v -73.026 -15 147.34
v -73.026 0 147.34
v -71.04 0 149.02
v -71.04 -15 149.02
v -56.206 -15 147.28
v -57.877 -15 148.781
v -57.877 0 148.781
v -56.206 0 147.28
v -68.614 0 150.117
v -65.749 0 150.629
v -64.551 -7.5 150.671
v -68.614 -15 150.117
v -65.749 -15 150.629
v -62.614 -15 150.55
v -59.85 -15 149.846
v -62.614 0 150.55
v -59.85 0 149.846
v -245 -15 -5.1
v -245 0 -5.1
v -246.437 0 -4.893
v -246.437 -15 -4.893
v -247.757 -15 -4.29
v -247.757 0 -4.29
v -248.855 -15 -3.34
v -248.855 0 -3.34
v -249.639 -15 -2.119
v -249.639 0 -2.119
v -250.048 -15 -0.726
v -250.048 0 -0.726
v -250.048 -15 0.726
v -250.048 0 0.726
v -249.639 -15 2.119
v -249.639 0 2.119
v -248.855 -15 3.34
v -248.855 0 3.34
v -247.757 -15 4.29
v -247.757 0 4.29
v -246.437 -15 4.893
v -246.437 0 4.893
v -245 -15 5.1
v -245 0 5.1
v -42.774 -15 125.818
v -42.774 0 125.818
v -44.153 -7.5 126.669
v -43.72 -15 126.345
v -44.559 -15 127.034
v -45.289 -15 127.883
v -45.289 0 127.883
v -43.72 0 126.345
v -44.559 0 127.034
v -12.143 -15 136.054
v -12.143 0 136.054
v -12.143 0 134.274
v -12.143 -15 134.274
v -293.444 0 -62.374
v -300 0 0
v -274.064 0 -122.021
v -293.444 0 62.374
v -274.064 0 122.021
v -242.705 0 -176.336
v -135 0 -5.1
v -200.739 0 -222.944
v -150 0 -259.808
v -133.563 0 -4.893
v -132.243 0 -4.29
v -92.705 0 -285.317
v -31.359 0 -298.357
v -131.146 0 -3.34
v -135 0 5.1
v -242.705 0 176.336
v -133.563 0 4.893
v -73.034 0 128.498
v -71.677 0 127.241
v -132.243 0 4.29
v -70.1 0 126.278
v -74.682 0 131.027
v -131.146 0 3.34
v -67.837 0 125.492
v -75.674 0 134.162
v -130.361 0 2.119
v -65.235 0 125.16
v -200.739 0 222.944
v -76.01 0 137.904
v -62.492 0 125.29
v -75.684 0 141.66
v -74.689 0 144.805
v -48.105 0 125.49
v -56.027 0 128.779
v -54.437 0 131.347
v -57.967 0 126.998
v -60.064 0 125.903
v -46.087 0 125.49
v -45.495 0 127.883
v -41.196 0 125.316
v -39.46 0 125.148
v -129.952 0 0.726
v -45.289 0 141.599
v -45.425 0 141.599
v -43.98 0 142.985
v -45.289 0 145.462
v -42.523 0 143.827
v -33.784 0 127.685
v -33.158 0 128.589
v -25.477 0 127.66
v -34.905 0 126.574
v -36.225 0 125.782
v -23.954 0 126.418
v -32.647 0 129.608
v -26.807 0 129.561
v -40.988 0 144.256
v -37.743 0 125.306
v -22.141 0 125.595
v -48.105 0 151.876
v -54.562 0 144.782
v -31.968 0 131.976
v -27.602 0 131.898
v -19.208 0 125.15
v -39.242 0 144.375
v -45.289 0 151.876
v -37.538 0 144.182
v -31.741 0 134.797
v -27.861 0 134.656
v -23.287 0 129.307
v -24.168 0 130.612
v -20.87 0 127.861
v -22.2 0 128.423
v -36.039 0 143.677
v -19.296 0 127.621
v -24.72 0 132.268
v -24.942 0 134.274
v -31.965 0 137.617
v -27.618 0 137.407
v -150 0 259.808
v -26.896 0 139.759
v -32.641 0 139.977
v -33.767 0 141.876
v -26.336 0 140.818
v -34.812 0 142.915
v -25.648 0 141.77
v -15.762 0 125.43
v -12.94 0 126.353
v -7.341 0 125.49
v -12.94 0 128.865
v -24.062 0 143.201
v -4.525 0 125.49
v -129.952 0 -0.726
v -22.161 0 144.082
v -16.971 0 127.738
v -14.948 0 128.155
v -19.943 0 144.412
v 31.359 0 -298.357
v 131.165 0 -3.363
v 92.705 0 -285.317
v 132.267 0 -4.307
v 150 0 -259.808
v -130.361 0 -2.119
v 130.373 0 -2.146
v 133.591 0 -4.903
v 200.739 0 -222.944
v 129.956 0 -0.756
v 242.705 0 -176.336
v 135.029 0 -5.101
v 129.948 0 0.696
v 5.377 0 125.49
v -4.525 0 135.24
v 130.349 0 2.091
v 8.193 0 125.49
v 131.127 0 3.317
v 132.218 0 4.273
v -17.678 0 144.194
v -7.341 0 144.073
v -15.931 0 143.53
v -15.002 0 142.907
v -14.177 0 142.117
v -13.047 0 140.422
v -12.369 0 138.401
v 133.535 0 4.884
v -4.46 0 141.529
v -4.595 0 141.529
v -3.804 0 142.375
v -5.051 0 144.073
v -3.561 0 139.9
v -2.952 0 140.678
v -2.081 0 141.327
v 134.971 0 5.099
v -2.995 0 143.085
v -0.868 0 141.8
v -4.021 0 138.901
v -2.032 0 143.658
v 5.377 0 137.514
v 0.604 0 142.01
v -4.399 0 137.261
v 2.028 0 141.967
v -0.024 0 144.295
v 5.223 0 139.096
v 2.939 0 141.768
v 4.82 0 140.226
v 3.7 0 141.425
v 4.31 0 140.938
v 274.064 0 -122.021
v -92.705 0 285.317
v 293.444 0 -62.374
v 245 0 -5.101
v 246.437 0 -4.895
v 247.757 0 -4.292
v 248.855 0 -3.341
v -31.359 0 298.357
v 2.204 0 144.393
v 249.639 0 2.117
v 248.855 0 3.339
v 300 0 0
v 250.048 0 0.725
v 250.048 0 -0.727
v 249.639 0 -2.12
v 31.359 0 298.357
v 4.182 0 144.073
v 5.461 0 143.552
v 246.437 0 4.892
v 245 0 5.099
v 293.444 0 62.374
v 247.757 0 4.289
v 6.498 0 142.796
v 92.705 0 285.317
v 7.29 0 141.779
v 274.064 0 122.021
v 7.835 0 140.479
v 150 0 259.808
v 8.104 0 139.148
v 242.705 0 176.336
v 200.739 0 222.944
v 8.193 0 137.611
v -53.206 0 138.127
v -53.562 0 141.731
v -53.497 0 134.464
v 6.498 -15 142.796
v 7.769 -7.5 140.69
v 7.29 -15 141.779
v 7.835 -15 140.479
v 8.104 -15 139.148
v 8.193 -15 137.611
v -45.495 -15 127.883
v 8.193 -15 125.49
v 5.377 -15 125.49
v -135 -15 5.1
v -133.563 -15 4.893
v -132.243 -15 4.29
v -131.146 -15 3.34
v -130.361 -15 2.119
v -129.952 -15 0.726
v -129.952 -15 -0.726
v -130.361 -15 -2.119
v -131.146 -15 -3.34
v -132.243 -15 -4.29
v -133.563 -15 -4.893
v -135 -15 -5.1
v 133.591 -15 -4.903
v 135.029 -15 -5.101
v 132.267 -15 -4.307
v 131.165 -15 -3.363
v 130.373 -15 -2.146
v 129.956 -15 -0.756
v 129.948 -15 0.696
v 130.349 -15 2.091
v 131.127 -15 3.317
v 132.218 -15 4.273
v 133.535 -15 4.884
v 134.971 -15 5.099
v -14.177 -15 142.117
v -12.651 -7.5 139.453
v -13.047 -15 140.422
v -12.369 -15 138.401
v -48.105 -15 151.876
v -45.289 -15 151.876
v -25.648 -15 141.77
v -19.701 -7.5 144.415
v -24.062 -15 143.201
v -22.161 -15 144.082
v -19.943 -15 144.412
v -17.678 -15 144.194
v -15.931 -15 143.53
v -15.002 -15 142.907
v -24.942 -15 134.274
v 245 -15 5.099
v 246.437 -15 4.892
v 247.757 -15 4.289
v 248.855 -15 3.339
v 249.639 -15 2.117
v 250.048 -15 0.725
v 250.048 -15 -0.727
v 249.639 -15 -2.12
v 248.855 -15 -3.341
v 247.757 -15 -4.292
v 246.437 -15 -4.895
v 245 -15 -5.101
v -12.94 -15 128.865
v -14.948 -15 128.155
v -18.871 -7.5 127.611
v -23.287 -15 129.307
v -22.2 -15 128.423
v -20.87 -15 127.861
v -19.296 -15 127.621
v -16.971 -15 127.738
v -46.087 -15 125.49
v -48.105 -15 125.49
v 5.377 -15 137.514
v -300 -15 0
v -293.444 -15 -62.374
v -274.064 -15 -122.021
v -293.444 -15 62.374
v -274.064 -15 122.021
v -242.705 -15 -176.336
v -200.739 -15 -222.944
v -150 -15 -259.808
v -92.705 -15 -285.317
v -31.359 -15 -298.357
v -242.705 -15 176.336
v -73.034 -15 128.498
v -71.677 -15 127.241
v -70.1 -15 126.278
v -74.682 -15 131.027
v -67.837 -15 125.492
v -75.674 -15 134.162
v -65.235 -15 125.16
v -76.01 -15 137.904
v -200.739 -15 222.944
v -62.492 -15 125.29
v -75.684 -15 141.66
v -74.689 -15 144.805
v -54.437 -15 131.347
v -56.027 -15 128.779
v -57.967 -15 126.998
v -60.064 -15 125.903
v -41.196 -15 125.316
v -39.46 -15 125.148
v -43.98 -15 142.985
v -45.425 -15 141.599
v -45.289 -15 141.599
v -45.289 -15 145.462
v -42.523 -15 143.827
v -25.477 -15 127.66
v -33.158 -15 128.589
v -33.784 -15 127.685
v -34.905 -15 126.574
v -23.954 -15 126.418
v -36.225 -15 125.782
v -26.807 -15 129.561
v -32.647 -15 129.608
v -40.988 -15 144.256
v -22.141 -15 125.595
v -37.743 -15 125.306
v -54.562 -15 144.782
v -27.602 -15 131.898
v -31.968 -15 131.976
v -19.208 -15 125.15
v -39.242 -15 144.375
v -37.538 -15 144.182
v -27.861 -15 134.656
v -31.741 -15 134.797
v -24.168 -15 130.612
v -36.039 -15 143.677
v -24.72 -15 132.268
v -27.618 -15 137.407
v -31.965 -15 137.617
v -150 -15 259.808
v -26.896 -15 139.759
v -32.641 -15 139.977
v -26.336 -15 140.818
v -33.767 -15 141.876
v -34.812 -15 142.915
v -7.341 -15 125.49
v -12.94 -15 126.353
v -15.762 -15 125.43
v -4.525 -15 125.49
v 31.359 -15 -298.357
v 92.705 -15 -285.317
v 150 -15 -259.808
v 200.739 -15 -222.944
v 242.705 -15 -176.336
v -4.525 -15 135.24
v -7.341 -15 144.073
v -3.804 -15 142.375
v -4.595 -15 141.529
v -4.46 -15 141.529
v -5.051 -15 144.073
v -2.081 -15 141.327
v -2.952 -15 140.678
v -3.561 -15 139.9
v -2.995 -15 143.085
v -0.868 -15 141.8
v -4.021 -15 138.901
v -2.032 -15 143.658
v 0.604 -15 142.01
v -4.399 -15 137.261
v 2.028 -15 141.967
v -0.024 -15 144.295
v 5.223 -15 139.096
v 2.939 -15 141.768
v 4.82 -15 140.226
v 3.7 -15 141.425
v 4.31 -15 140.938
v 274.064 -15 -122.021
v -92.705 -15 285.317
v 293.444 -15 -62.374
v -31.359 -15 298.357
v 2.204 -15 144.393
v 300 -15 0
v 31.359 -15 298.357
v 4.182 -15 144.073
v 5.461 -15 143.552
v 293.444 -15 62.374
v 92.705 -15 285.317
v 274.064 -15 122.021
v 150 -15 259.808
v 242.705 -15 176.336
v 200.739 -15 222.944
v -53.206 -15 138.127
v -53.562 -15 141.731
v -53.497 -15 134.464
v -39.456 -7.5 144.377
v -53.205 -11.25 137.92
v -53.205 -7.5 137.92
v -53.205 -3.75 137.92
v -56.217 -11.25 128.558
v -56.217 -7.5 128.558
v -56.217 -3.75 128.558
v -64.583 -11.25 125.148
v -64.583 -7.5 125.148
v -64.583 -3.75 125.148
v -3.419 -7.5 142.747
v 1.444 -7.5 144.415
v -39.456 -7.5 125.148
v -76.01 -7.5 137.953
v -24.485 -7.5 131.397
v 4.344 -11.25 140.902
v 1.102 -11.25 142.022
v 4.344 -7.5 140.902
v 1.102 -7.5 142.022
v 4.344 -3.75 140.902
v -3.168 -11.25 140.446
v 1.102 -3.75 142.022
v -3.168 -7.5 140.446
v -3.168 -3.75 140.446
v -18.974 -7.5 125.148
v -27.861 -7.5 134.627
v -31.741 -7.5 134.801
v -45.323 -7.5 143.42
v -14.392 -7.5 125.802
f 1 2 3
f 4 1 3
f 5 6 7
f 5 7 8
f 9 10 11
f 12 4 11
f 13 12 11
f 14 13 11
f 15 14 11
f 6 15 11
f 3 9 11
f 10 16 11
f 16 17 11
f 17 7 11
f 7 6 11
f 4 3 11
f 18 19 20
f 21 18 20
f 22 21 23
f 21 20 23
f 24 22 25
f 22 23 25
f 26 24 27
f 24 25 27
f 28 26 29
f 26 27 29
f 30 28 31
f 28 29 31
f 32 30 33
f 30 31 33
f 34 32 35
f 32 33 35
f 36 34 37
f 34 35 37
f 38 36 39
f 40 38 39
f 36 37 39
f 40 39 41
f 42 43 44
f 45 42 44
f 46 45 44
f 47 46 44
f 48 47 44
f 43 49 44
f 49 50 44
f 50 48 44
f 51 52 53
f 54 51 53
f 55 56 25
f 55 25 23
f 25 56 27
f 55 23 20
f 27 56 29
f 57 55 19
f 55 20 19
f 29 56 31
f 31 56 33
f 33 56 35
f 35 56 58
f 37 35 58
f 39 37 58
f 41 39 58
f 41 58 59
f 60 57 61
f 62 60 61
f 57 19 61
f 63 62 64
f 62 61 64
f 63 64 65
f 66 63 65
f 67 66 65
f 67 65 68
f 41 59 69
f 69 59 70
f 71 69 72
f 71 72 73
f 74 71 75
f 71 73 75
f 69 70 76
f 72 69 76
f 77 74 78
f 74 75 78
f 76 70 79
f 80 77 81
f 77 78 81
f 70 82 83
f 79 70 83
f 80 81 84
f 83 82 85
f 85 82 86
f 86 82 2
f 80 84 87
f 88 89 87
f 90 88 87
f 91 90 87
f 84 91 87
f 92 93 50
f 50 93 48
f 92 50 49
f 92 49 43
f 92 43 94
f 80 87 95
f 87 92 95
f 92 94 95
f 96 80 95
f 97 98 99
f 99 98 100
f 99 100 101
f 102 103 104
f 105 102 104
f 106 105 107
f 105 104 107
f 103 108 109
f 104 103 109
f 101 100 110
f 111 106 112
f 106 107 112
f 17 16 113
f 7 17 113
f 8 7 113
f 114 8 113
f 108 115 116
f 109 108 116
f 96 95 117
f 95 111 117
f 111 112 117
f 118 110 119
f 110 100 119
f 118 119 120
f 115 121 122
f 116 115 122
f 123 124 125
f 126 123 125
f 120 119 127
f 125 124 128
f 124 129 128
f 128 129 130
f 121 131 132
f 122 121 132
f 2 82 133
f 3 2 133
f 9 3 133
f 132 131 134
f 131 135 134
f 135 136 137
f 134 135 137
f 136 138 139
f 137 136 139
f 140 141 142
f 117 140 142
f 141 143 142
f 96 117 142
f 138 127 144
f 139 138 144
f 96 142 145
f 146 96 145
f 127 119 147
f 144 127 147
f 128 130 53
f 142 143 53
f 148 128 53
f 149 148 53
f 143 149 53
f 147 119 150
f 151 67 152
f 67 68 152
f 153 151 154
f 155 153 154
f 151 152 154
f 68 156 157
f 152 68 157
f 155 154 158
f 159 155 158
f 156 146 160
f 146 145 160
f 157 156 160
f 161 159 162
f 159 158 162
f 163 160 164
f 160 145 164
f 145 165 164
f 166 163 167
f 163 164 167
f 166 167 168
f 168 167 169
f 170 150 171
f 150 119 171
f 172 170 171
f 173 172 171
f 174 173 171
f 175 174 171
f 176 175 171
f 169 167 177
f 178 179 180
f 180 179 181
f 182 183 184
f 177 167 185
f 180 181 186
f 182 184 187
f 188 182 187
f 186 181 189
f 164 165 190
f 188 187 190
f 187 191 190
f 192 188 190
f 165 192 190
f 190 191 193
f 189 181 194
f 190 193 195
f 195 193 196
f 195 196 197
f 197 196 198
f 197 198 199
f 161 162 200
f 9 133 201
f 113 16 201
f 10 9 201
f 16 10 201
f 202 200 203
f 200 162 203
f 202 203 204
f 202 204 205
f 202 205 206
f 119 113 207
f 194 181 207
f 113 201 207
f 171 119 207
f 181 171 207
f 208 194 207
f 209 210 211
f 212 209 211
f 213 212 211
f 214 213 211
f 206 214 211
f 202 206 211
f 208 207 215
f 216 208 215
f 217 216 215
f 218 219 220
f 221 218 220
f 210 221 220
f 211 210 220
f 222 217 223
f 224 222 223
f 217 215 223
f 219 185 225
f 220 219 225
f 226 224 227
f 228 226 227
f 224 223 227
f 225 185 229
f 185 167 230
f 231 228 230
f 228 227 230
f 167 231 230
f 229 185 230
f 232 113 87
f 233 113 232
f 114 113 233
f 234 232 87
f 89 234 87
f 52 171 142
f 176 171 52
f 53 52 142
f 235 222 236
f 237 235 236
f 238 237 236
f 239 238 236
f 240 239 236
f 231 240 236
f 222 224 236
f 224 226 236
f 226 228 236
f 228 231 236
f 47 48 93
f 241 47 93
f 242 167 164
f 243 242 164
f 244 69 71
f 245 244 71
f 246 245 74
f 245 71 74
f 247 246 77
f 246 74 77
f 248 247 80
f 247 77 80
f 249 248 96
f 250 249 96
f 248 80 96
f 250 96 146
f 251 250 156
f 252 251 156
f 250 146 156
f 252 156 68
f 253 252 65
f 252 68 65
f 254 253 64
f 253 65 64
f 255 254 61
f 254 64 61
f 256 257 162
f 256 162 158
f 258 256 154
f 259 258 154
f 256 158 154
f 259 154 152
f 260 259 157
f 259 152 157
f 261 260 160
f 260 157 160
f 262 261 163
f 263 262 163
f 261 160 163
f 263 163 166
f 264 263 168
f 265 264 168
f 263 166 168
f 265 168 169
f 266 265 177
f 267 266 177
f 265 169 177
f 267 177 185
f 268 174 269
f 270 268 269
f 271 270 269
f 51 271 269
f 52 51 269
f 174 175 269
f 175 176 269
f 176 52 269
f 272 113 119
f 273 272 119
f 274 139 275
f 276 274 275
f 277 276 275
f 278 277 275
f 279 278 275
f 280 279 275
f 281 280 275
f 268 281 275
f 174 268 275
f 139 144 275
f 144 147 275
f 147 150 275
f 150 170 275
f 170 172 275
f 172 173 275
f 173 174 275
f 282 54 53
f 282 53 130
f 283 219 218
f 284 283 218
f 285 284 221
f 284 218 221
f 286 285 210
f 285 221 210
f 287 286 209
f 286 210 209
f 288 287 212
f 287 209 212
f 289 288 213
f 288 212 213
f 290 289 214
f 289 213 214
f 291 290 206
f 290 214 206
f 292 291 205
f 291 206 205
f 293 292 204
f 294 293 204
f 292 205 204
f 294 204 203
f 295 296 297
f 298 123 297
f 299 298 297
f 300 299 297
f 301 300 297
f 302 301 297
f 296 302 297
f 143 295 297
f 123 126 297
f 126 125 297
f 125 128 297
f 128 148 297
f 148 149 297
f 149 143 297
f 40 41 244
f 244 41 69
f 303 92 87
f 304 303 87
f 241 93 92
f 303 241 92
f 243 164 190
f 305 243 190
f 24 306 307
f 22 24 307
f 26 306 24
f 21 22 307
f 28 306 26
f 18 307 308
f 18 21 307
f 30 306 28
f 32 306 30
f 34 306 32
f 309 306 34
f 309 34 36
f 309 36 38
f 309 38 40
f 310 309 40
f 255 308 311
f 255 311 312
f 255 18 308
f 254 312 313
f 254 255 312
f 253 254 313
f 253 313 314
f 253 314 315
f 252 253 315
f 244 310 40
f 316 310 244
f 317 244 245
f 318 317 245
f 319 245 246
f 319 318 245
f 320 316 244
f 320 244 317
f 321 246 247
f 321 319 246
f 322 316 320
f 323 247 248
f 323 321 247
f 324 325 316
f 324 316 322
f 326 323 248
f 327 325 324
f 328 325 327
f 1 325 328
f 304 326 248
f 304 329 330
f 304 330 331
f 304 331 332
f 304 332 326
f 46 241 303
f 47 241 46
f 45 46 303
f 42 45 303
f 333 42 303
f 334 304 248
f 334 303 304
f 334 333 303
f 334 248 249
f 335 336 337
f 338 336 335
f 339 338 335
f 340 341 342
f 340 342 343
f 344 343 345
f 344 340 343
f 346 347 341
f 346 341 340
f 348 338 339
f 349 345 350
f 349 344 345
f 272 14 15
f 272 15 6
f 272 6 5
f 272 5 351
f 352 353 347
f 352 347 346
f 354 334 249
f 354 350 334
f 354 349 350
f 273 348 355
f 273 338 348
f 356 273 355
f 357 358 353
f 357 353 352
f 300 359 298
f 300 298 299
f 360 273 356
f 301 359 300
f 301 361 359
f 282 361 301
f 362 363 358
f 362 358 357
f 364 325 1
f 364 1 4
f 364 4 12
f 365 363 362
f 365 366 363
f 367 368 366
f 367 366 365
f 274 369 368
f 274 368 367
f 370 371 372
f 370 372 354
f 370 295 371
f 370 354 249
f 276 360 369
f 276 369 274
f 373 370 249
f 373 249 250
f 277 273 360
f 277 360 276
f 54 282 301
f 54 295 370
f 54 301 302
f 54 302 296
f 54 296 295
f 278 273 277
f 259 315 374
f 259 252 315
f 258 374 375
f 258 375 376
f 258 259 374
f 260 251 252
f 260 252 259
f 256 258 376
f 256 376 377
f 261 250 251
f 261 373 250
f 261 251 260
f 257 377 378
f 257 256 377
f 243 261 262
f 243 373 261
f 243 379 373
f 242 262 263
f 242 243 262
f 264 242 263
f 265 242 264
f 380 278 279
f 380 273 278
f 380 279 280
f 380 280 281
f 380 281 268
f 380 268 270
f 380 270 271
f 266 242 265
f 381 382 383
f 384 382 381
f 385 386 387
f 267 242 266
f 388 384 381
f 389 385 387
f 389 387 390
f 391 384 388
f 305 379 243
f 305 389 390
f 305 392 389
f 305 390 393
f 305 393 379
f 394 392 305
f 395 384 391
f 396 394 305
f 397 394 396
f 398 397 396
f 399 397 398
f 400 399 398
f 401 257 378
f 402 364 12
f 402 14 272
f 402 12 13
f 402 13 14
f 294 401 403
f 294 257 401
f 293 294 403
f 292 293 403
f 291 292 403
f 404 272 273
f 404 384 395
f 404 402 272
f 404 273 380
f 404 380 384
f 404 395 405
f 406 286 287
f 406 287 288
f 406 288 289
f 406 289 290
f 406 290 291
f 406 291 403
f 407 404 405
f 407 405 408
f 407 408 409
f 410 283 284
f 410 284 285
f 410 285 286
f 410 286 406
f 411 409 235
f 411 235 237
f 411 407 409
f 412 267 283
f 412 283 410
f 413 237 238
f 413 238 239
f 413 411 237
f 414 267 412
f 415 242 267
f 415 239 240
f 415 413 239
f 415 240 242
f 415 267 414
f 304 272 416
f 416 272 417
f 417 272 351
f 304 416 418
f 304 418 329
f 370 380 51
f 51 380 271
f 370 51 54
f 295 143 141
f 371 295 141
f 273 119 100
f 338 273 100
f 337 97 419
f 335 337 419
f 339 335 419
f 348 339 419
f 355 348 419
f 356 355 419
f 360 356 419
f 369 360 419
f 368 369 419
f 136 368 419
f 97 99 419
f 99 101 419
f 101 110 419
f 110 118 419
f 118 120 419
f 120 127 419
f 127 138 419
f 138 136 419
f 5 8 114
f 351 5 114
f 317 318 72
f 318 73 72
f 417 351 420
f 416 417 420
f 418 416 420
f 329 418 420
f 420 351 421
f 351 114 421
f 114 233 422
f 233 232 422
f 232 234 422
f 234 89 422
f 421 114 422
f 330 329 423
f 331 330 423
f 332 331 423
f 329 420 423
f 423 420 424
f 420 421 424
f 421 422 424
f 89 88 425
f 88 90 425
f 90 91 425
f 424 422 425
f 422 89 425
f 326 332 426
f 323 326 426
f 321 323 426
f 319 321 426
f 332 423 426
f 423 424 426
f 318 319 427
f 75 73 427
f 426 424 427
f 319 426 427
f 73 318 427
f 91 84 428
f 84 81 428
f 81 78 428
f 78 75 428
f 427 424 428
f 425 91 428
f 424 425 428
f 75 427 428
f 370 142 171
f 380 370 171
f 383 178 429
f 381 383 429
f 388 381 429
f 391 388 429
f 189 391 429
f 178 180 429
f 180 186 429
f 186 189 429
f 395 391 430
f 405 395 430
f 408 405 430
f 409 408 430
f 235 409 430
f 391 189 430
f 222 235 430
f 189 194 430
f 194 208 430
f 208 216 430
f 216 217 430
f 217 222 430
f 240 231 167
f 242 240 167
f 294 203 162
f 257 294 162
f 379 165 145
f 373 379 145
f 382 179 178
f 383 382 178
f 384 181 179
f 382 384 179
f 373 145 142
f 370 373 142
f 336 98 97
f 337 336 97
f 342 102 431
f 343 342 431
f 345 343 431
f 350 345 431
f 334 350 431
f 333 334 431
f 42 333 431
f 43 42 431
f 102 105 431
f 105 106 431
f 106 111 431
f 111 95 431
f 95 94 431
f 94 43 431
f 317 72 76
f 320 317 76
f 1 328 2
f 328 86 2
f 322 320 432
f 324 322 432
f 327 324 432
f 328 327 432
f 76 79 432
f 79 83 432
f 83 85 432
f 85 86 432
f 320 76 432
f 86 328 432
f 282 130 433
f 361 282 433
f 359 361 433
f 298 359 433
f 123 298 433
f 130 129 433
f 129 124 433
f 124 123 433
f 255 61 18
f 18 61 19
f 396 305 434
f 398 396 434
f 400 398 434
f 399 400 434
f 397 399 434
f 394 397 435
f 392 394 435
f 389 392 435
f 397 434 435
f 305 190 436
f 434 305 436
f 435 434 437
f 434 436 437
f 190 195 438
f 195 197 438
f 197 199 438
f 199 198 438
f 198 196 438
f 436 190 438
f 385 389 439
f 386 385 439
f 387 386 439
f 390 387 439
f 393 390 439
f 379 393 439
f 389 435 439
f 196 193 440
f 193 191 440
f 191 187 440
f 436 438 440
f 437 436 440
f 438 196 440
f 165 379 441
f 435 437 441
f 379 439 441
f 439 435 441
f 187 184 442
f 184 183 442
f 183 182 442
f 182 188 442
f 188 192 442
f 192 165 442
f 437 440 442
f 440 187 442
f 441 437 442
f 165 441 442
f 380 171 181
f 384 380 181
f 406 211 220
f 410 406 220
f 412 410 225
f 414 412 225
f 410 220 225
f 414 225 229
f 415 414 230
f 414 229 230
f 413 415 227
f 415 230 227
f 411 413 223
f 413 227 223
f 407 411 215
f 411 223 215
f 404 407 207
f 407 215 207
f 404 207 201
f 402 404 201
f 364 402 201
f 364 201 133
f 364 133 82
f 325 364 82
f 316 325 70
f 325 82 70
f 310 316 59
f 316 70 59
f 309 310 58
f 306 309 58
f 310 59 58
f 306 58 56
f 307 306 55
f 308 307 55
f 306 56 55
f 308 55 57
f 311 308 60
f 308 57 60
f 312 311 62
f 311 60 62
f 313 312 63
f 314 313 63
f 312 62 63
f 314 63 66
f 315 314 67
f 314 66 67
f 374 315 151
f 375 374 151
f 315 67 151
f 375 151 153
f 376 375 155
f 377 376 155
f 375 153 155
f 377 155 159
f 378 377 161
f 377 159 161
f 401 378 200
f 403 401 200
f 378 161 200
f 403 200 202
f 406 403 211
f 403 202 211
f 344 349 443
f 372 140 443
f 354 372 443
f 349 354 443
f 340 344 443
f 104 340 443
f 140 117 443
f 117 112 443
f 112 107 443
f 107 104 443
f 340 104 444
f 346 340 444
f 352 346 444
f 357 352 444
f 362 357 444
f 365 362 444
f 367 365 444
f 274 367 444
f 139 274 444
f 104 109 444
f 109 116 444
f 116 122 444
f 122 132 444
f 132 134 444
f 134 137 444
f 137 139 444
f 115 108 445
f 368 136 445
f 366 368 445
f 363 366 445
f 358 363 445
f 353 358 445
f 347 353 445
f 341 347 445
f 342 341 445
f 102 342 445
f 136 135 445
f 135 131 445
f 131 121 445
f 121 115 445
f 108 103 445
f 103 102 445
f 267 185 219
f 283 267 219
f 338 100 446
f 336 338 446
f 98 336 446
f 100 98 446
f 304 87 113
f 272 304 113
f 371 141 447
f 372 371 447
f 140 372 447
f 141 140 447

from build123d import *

# Parameters (mm, degrees)
F0_R     = 300.0001975894
F1_DEPTH = 15


with BuildPart() as f1:
    # F0 (on Front) → F1 (new body)
    with BuildSketch(Plane.XZ):
        Circle(F0_R)
        with BuildLine():
            ThreePointArc((-245.0001975894, -5.1), (-250.1001975894, 0), (-245.0001975894, 5.1))
            Line((-245.0001975894, 5.1), (-135, 5.1))
            ThreePointArc((-135, 5.1), (-129.9, 0), (-135, -5.1))
            Line((-135, -5.1), (-245.0001975894, -5.1))
        make_face(mode=Mode.SUBTRACT)
        with BuildLine():
            ThreePointArc((135.0291466713, -5.1012321273), (129.9, -0.0303787986), (134.9708533287, 5.0987678727))
            Line((134.9708533287, 5.0987678727), (245.0001975894, 5.0987678727))
            ThreePointArc((245.0001975894, 5.0987678727), (250.1001975894, -0.0012321273), (245.0001975894, -5.1012321273))
            Line((245.0001975894, -5.1012321273), (135.0291466713, -5.1012321273))
        make_face(mode=Mode.SUBTRACT)
        with BuildLine():
            add(Edge.make_bspline(
                [(-56.2059473305, 147.280047389), (-53.2054559961, 143.8888953384), (-53.2054559961, 137.9204677295)],
                knots=[0, 0, 0, 1, 1, 1], degree=2))
            add(Edge.make_bspline(
                [(-53.2054559961, 137.9204677295), (-53.2054559961, 131.9683176504), (-56.216799017, 128.5581751484)],
                knots=[0, 0, 0, 1, 1, 1], degree=2))
            add(Edge.make_bspline(
                [(-56.216799017, 128.5581751484), (-59.2281420379, 125.1480326464), (-64.5834493561, 125.1480326464)],
                knots=[0, 0, 0, 1, 1, 1], degree=2))
            add(Edge.make_bspline(
                [(-64.5834493561, 125.1480326464), (-70.0581252264, 125.1480326464), (-73.034200266, 128.4984908723)],
                knots=[0, 0, 0, 1, 1, 1], degree=2))
            add(Edge.make_bspline(
                [(-73.034200266, 128.4984908723), (-76.0102753055, 131.8489490982), (-76.0102753055, 137.9530227892)],
                knots=[0, 0, 0, 1, 1, 1], degree=2))
            add(Edge.make_bspline(
                [(-76.0102753055, 137.9530227892), (-76.0102753055, 144.0082638906), (-73.0260615011, 147.339731665)],
                knots=[0, 0, 0, 1, 1, 1], degree=2))
            add(Edge.make_bspline(
                [(-73.0260615011, 147.339731665), (-70.0418476966, 150.6711994395), (-64.5508942964, 150.6711994395)],
                knots=[0, 0, 0, 1, 1, 1], degree=2))
            add(Edge.make_bspline(
                [(-64.5508942964, 150.6711994395), (-59.2064386648, 150.6711994395), (-56.2059473305, 147.280047389)],
                knots=[0, 0, 0, 1, 1, 1], degree=2))
        make_face(mode=Mode.SUBTRACT)
        with BuildLine():
            add(Edge.make_bspline(
                [(-45.2891506494, 141.5991894739), (-43.3249953817, 144.3772212337), (-39.4563691225, 144.3772212337)],
                knots=[0, 0, 0, 1, 1, 1], degree=2))
            add(Edge.make_bspline(
                [(-39.4563691225, 144.3772212337), (-35.7939249079, 144.3772212337), (-33.7673724425, 141.8759074812)],
                knots=[0, 0, 0, 1, 1, 1], degree=2))
            add(Edge.make_bspline(
                [(-33.7673724425, 141.8759074812), (-31.7408199771, 139.3745937288), (-31.7408199771, 134.800607843)],
                knots=[0, 0, 0, 1, 1, 1], degree=2))
            add(Edge.make_bspline(
                [(-31.7408199771, 134.800607843), (-31.7408199771, 130.221196114), (-33.7836499724, 127.6846143802)],
                knots=[0, 0, 0, 1, 1, 1], degree=2))
            add(Edge.make_bspline(
                [(-33.7836499724, 127.6846143802), (-35.8264799676, 125.1480326464), (-39.4563691225, 125.1480326464)],
                knots=[0, 0, 0, 1, 1, 1], degree=2))
            add(Edge.make_bspline(
                [(-39.4563691225, 125.1480326464), (-41.2740266216, 125.1480326464), (-42.7742722887, 125.8181242916)],
                knots=[0, 0, 0, 1, 1, 1], degree=2))
            add(Edge.make_bspline(
                [(-42.7742722887, 125.8181242916), (-44.2745179559, 126.4882159368), (-45.2891506494, 127.8826576599)],
                knots=[0, 0, 0, 1, 1, 1], degree=2))
            Line((-45.2891506494, 127.8826576599), (-45.4953326941, 127.8826576599))
            Line((-45.4953326941, 127.8826576599), (-46.0867496117, 125.4898607731))
            Line((-46.0867496117, 125.4898607731), (-48.1051633122, 125.4898607731))
            Line((-48.1051633122, 125.4898607731), (-48.1051633122, 151.8757366478))
            Line((-48.1051633122, 151.8757366478), (-45.2891506494, 151.8757366478))
            Line((-45.2891506494, 151.8757366478), (-45.2891506494, 145.4623898899))
            add(Edge.make_bspline(
                [(-45.2891506494, 145.4623898899), (-45.2891506494, 143.3083301074), (-45.4247967314, 141.5991894739)],
                knots=[0, 0, 0, 1, 1, 1], degree=2))
            Line((-45.4247967314, 141.5991894739), (-45.2891506494, 141.5991894739))
        make_face(mode=Mode.SUBTRACT)
        with BuildLine():
            add(Edge.make_bspline(
                [(-15.761711515, 125.430176497), (-17.0910431189, 125.1480326464), (-18.9738107373, 125.1480326464)],
                knots=[0, 0, 0, 1, 1, 1], degree=2))
            add(Edge.make_bspline(
                [(-18.9738107373, 125.1480326464), (-23.0920257875, 125.1480326464), (-25.4766839094, 127.6601980854)],
                knots=[0, 0, 0, 1, 1, 1], degree=2))
            add(Edge.make_bspline(
                [(-25.4766839094, 127.6601980854), (-27.8613420313, 130.1723635245), (-27.8613420313, 134.626980858)],
                knots=[0, 0, 0, 1, 1, 1], degree=2))
            add(Edge.make_bspline(
                [(-27.8613420313, 134.626980858), (-27.8613420313, 139.1250049378), (-25.6475979727, 141.7701035373)],
                knots=[0, 0, 0, 1, 1, 1], degree=2))
            add(Edge.make_bspline(
                [(-25.6475979727, 141.7701035373), (-23.4338539142, 144.4152021367), (-19.7008737369, 144.4152021367)],
                knots=[0, 0, 0, 1, 1, 1], degree=2))
            add(Edge.make_bspline(
                [(-19.7008737369, 144.4152021367), (-16.2120565074, 144.4152021367), (-14.177365277, 142.1173575072)],
                knots=[0, 0, 0, 1, 1, 1], degree=2))
            add(Edge.make_bspline(
                [(-14.177365277, 142.1173575072), (-12.1426740467, 139.8195128778), (-12.1426740467, 136.0539776409)],
                knots=[0, 0, 0, 1, 1, 1], degree=2))
            Line((-12.1426740467, 136.0539776409), (-12.1426740467, 134.2743010448))
            Line((-12.1426740467, 134.2743010448), (-24.9422383462, 134.2743010448))
            add(Edge.make_bspline(
                [(-24.9422383462, 134.2743010448), (-24.8554248537, 131.0025175464), (-23.2873561456, 129.3069415212)],
                knots=[0, 0, 0, 1, 1, 1], degree=2))
            add(Edge.make_bspline(
                [(-23.2873561456, 129.3069415212), (-21.7192874374, 127.6113654959), (-18.870719715, 127.6113654959)],
                knots=[0, 0, 0, 1, 1, 1], degree=2))
            add(Edge.make_bspline(
                [(-18.870719715, 127.6113654959), (-15.8702283807, 127.6113654959), (-12.940273009, 128.8647352938)],
                knots=[0, 0, 0, 1, 1, 1], degree=2))
            Line((-12.940273009, 128.8647352938), (-12.940273009, 126.3525698547))
            add(Edge.make_bspline(
                [(-12.940273009, 126.3525698547), (-14.4323799112, 125.7123203476), (-15.761711515, 125.430176497)],
                knots=[0, 0, 0, 1, 1, 1], degree=2))
        make_face(mode=Mode.SUBTRACT)
        with BuildLine():
            Line((8.1933865699, 125.4898607731), (5.3773739071, 125.4898607731))
            Line((5.3773739071, 125.4898607731), (5.3773739071, 137.5135294834))
            add(Edge.make_bspline(
                [(5.3773739071, 137.5135294834), (5.3773739071, 139.7815319748), (4.3437507621, 140.9019686123)],
                knots=[0, 0, 0, 1, 1, 1], degree=2))
            add(Edge.make_bspline(
                [(4.3437507621, 140.9019686123), (3.3101276171, 142.0224052498), (1.1018094018, 142.0224052498)],
                knots=[0, 0, 0, 1, 1, 1], degree=2))
            add(Edge.make_bspline(
                [(1.1018094018, 142.0224052498), (-1.81186844, 142.0224052498), (-3.1683292602, 140.4461977767)],
                knots=[0, 0, 0, 1, 1, 1], degree=2))
            add(Edge.make_bspline(
                [(-3.1683292602, 140.4461977767), (-4.5247900804, 138.8699903036), (-4.5247900804, 135.2401011488)],
                knots=[0, 0, 0, 1, 1, 1], degree=2))
            Line((-4.5247900804, 135.2401011488), (-4.5247900804, 125.4898607731))
            Line((-4.5247900804, 125.4898607731), (-7.3408027432, 125.4898607731))
            Line((-7.3408027432, 125.4898607731), (-7.3408027432, 144.07337401))
            Line((-7.3408027432, 144.07337401), (-5.0510968787, 144.07337401))
            Line((-5.0510968787, 144.07337401), (-4.5953260431, 141.5286535113))
            Line((-4.5953260431, 141.5286535113), (-4.459679961, 141.5286535113))
            add(Edge.make_bspline(
                [(-4.459679961, 141.5286535113), (-3.5915450361, 142.9013918613), (-2.0316150929, 143.658296999)],
                knots=[0, 0, 0, 1, 1, 1], degree=2))
            add(Edge.make_bspline(
                [(-2.0316150929, 143.658296999), (-0.4716851496, 144.4152021367), (1.4436375285, 144.4152021367)],
                knots=[0, 0, 0, 1, 1, 1], degree=2))
            add(Edge.make_bspline(
                [(1.4436375285, 144.4152021367), (4.8022345194, 144.4152021367), (6.4978105446, 142.7955879173)],
                knots=[0, 0, 0, 1, 1, 1], degree=2))
            add(Edge.make_bspline(
                [(6.4978105446, 142.7955879173), (8.1933865699, 141.175973698), (8.1933865699, 137.6111946625)],
                knots=[0, 0, 0, 1, 1, 1], degree=2))
            Line((8.1933865699, 137.6111946625), (8.1933865699, 125.4898607731))
        make_face(mode=Mode.SUBTRACT)
    extrude(amount=F1_DEPTH)


solid = f1.part
